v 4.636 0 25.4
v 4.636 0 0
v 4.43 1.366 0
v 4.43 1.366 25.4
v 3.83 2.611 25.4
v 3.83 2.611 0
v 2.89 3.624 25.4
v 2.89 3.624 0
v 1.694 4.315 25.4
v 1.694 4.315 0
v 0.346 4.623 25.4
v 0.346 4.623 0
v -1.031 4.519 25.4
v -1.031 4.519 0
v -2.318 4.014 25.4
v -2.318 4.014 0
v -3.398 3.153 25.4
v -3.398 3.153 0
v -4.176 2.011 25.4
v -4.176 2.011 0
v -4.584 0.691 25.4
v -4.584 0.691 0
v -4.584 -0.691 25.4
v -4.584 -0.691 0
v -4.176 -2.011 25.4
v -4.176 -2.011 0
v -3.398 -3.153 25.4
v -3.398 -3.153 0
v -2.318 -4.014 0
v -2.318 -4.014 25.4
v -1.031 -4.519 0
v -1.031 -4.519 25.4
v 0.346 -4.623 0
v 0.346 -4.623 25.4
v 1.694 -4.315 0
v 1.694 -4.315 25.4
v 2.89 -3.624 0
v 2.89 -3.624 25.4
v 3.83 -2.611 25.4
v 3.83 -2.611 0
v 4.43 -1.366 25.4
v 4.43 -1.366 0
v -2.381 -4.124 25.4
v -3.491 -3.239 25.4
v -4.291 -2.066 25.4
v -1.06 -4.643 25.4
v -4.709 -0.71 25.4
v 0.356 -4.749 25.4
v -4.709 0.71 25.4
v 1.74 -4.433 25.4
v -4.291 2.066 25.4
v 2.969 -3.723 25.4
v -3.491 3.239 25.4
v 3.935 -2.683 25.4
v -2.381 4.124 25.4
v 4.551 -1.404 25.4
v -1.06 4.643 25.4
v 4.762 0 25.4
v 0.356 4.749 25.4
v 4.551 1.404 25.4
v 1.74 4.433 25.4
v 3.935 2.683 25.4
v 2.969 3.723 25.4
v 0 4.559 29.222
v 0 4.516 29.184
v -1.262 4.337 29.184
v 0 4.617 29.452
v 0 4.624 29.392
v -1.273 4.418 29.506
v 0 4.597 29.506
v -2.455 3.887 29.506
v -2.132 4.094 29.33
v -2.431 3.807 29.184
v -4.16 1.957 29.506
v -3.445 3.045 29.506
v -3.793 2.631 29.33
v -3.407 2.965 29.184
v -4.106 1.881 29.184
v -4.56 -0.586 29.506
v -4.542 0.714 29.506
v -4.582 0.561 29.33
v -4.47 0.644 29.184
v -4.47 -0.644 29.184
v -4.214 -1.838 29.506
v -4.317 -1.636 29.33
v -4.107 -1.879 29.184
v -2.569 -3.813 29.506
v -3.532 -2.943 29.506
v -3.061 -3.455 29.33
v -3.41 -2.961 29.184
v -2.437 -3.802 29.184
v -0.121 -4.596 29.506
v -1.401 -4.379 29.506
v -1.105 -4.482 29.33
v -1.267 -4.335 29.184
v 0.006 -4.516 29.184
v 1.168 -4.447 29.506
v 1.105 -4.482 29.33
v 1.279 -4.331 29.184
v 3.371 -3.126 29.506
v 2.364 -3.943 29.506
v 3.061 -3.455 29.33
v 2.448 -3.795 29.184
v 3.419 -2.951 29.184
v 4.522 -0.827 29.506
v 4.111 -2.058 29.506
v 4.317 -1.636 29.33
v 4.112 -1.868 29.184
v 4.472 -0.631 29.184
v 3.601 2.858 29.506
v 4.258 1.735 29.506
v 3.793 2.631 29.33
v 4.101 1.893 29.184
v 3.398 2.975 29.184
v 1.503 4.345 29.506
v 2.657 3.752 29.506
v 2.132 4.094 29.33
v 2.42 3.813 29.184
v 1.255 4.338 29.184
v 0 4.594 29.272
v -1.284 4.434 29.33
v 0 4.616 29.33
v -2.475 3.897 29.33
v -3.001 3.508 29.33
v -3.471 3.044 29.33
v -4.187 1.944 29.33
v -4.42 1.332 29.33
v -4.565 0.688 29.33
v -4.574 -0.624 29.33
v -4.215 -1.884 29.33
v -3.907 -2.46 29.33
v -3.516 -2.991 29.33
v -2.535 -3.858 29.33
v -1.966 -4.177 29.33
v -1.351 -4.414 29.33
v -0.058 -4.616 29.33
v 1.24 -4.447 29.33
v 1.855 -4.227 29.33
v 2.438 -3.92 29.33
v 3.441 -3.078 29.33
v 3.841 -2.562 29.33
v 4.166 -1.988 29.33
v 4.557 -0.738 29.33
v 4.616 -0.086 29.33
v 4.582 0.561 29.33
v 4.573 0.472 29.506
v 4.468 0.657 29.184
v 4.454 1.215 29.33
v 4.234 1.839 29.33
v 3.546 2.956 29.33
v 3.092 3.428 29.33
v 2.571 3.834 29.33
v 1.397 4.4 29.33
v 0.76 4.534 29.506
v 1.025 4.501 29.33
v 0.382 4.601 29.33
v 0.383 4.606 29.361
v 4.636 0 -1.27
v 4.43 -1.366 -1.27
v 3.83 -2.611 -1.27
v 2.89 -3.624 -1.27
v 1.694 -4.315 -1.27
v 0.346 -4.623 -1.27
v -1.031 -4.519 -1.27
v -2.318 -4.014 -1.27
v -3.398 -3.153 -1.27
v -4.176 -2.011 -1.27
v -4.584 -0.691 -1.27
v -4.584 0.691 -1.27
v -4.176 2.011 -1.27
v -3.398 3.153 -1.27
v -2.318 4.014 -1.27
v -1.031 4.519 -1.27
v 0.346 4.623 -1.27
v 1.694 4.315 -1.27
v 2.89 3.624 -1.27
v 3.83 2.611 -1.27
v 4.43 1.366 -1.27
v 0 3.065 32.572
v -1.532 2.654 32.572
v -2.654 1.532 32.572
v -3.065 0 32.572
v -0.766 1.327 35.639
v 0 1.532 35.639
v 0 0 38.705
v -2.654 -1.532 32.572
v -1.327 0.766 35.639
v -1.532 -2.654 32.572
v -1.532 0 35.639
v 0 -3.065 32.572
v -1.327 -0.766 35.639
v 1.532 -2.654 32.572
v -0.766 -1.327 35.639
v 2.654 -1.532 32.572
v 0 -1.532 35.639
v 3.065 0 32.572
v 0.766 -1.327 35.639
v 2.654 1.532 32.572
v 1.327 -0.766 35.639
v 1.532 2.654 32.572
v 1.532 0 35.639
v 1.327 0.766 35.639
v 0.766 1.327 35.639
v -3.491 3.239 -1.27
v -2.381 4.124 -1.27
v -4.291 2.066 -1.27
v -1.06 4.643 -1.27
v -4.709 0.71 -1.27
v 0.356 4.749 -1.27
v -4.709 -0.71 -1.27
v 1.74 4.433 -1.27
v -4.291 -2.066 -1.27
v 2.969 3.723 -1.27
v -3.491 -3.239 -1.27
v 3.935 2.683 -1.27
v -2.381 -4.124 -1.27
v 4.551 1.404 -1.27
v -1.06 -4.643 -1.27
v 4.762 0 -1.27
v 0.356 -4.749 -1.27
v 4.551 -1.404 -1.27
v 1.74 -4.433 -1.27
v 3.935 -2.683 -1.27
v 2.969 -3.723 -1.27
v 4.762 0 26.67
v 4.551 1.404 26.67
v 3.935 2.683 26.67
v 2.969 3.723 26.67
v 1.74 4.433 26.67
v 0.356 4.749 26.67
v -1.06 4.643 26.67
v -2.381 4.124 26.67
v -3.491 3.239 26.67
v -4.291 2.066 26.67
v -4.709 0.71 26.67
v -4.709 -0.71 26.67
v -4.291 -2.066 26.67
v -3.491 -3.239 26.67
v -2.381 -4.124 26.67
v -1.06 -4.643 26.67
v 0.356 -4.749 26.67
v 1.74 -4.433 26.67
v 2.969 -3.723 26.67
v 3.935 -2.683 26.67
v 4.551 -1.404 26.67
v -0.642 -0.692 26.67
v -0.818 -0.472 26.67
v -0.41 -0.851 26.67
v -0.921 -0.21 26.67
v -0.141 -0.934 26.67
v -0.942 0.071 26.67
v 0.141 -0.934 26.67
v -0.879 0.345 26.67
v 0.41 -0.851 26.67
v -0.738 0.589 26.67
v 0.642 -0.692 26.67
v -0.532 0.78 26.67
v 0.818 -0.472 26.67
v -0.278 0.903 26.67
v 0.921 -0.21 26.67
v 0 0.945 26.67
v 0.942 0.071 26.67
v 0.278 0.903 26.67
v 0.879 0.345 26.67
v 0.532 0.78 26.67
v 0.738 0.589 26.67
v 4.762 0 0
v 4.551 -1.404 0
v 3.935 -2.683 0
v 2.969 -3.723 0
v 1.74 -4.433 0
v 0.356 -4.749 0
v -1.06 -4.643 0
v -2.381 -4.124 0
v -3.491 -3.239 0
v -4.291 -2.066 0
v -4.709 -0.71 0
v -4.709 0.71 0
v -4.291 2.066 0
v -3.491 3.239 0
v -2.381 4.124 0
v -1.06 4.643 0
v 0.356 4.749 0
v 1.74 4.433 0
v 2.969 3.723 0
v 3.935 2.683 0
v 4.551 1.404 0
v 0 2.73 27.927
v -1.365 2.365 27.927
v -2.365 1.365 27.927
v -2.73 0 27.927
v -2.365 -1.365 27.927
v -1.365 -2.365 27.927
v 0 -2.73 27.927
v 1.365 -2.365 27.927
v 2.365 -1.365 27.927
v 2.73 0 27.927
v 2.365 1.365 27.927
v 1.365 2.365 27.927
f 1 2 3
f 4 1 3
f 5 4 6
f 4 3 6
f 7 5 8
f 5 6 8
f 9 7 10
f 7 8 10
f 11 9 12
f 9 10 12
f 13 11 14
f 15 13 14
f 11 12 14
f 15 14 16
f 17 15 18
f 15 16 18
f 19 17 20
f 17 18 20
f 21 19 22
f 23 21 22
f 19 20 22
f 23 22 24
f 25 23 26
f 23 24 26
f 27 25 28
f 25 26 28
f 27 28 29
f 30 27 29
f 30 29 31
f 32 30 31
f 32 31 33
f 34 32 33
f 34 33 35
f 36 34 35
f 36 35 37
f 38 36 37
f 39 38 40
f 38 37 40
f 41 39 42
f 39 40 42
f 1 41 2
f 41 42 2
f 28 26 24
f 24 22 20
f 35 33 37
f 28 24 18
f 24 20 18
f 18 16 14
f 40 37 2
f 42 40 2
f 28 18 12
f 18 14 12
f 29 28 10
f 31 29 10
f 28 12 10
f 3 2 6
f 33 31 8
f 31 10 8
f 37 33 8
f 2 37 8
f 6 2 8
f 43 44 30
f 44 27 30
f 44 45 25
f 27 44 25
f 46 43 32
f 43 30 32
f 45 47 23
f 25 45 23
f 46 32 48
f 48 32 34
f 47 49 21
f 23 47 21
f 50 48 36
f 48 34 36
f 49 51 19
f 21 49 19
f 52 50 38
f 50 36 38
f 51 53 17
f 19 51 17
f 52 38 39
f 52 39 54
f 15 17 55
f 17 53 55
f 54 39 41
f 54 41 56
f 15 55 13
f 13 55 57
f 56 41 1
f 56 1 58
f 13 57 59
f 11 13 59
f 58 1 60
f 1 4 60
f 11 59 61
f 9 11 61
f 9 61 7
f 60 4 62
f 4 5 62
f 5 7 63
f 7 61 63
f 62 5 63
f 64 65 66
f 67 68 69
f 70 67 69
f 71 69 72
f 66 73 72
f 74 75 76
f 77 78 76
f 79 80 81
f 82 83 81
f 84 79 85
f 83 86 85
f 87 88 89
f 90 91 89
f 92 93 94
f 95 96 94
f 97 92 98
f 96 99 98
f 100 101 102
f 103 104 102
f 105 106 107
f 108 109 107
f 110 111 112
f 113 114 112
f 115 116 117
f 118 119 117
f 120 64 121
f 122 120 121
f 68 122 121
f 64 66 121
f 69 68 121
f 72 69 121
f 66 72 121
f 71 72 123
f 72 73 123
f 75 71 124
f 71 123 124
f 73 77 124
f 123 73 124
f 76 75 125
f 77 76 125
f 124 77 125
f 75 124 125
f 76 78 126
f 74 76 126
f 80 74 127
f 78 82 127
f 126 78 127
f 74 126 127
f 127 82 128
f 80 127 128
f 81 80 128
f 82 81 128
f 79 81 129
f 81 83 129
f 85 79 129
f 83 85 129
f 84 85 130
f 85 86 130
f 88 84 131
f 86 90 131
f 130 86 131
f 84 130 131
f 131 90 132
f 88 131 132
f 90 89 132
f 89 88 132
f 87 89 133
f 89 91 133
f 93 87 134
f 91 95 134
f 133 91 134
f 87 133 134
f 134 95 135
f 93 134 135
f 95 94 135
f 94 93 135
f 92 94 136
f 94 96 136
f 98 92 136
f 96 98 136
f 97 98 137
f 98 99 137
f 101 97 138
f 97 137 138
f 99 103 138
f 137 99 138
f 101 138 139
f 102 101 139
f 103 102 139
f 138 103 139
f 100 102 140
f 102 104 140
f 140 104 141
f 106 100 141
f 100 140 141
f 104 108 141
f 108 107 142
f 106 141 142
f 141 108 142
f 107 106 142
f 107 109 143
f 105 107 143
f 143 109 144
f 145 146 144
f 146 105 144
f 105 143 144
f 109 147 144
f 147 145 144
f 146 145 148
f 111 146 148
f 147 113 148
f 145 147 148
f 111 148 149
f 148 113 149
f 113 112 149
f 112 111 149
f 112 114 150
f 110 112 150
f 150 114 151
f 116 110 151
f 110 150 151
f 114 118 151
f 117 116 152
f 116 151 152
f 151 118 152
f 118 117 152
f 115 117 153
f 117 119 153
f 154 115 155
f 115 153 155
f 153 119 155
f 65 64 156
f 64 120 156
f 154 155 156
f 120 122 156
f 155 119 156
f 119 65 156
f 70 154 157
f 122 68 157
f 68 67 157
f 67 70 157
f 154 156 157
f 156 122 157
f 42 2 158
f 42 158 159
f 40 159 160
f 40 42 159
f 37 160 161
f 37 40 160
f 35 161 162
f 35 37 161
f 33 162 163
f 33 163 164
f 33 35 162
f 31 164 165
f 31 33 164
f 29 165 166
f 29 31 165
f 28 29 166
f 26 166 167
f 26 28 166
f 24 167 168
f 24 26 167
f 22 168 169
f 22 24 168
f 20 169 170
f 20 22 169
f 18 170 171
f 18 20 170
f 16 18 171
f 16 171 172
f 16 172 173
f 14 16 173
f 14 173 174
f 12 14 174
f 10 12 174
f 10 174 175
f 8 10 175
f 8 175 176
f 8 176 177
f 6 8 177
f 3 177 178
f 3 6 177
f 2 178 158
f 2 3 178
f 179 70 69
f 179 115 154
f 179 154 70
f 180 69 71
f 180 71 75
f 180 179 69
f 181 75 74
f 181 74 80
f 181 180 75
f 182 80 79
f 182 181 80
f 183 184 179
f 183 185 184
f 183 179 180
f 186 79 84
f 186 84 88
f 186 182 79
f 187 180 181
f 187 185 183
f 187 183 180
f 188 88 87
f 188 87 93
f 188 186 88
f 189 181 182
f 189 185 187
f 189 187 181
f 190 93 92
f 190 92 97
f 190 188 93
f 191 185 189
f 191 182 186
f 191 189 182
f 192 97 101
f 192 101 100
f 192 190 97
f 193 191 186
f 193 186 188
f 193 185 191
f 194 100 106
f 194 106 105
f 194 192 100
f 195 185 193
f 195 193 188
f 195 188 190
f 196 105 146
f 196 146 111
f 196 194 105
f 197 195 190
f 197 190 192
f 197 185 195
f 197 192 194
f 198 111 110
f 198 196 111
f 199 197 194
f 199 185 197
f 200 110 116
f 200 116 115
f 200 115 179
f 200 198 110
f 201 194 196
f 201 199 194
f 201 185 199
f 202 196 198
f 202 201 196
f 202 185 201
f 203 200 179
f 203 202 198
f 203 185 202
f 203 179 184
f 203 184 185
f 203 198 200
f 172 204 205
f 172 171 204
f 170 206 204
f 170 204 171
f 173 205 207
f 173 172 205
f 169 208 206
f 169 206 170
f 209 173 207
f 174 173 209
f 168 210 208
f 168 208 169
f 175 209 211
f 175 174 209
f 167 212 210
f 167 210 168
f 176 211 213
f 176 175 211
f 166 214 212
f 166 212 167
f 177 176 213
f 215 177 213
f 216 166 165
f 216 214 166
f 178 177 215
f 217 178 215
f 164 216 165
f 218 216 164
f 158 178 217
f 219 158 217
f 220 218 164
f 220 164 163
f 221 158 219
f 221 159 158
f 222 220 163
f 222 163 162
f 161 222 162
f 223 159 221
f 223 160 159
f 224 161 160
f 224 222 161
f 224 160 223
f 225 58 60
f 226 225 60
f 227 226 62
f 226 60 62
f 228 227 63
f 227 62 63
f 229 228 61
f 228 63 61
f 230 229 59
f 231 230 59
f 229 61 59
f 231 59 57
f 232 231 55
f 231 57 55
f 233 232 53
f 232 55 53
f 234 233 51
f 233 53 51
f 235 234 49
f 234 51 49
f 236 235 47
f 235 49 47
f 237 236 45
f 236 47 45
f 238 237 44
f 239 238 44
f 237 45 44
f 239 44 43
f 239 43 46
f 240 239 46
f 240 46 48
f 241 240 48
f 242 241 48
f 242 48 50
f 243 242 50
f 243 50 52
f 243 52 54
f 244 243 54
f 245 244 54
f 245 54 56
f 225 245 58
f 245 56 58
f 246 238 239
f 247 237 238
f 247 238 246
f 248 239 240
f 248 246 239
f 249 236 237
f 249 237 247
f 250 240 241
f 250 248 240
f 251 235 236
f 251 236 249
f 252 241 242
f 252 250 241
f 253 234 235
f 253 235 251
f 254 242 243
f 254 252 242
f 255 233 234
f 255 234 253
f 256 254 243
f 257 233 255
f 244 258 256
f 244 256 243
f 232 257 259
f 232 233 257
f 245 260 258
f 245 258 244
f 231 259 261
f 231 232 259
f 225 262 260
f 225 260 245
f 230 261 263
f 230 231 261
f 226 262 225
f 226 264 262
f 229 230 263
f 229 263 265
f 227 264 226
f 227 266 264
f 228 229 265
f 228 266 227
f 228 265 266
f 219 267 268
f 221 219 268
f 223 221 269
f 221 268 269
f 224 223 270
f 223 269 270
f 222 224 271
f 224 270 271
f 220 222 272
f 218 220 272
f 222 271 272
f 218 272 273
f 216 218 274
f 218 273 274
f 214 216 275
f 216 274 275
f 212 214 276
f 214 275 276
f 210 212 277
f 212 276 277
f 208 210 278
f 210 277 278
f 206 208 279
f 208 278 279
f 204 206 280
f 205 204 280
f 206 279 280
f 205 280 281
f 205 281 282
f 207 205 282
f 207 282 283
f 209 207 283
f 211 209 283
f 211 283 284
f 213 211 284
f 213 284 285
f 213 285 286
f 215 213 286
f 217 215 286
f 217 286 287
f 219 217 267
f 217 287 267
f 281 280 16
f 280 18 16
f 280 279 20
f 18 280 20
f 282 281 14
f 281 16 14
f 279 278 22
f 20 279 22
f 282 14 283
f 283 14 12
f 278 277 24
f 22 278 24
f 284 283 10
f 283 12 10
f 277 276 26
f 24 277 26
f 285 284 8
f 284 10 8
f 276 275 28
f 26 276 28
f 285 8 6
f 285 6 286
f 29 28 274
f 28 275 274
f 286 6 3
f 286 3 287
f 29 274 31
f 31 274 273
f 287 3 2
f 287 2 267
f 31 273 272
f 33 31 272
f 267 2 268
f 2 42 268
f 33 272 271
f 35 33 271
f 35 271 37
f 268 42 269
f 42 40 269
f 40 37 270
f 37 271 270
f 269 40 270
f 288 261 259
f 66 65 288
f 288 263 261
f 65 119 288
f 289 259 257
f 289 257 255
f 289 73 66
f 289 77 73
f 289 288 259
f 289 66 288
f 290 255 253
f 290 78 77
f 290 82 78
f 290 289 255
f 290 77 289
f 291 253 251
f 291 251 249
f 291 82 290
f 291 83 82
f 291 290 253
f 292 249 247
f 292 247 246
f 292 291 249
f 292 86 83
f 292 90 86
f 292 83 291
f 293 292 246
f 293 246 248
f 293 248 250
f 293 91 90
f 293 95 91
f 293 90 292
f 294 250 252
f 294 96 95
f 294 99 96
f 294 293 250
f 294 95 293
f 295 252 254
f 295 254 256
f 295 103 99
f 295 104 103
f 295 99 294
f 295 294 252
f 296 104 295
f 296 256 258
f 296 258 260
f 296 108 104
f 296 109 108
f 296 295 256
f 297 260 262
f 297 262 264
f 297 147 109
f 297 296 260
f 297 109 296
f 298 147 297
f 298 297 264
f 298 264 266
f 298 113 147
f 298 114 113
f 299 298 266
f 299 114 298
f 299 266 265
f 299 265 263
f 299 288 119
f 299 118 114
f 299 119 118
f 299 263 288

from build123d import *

# Parameters (mm, degrees)
F0_R     = 4.6355
F1_DEPTH = 25.4
F2_R     = 4.7625
F3_DEPTH = 1.27
F4_R     = 4.7625
F4_R_2   = 4.6355
F5_DEPTH = 1.27
F8_R     = 0.254


with BuildPart() as f1:
    # F0 (on Top) → F1 (new body)
    with BuildSketch(Plane.XY):
        Circle(F0_R)
    extrude(amount=F1_DEPTH)

    # F2 (on face) → F3 (join)
    with BuildSketch(Plane.XY.offset(25.4)):
        Circle(F2_R)
    extrude(amount=F3_DEPTH)

    # F6 (on Right) → F7 (revolve)
    with BuildSketch(Plane.YZ):
        Polygon((0, 38.7051041842), (0, 26.0051041842), (4.6950788237, 29.3100513518), align=None)
    revolve(axis=Axis((0, 0, 32.3551041842), (0, 0, 1)))

    # F8
    f8_edges = [f1.edges().sort_by_distance(p)[0] for p in [
        (0, -4.695079, 29.310051),
        (0, 2.347539, 34.007578),
    ]]
    fillet(f8_edges, radius=F8_R)


with BuildPart() as f5:
    # F4 (on face) → F5 (new body)
    with BuildSketch(Plane(origin=(0, 0, 0), x_dir=(1, 0, 0), z_dir=(0, 0, -1))):
        Circle(F4_R)
        Circle(F4_R_2, mode=Mode.SUBTRACT)
    extrude(amount=F5_DEPTH)


solid = Compound([f1.part, f5.part])
